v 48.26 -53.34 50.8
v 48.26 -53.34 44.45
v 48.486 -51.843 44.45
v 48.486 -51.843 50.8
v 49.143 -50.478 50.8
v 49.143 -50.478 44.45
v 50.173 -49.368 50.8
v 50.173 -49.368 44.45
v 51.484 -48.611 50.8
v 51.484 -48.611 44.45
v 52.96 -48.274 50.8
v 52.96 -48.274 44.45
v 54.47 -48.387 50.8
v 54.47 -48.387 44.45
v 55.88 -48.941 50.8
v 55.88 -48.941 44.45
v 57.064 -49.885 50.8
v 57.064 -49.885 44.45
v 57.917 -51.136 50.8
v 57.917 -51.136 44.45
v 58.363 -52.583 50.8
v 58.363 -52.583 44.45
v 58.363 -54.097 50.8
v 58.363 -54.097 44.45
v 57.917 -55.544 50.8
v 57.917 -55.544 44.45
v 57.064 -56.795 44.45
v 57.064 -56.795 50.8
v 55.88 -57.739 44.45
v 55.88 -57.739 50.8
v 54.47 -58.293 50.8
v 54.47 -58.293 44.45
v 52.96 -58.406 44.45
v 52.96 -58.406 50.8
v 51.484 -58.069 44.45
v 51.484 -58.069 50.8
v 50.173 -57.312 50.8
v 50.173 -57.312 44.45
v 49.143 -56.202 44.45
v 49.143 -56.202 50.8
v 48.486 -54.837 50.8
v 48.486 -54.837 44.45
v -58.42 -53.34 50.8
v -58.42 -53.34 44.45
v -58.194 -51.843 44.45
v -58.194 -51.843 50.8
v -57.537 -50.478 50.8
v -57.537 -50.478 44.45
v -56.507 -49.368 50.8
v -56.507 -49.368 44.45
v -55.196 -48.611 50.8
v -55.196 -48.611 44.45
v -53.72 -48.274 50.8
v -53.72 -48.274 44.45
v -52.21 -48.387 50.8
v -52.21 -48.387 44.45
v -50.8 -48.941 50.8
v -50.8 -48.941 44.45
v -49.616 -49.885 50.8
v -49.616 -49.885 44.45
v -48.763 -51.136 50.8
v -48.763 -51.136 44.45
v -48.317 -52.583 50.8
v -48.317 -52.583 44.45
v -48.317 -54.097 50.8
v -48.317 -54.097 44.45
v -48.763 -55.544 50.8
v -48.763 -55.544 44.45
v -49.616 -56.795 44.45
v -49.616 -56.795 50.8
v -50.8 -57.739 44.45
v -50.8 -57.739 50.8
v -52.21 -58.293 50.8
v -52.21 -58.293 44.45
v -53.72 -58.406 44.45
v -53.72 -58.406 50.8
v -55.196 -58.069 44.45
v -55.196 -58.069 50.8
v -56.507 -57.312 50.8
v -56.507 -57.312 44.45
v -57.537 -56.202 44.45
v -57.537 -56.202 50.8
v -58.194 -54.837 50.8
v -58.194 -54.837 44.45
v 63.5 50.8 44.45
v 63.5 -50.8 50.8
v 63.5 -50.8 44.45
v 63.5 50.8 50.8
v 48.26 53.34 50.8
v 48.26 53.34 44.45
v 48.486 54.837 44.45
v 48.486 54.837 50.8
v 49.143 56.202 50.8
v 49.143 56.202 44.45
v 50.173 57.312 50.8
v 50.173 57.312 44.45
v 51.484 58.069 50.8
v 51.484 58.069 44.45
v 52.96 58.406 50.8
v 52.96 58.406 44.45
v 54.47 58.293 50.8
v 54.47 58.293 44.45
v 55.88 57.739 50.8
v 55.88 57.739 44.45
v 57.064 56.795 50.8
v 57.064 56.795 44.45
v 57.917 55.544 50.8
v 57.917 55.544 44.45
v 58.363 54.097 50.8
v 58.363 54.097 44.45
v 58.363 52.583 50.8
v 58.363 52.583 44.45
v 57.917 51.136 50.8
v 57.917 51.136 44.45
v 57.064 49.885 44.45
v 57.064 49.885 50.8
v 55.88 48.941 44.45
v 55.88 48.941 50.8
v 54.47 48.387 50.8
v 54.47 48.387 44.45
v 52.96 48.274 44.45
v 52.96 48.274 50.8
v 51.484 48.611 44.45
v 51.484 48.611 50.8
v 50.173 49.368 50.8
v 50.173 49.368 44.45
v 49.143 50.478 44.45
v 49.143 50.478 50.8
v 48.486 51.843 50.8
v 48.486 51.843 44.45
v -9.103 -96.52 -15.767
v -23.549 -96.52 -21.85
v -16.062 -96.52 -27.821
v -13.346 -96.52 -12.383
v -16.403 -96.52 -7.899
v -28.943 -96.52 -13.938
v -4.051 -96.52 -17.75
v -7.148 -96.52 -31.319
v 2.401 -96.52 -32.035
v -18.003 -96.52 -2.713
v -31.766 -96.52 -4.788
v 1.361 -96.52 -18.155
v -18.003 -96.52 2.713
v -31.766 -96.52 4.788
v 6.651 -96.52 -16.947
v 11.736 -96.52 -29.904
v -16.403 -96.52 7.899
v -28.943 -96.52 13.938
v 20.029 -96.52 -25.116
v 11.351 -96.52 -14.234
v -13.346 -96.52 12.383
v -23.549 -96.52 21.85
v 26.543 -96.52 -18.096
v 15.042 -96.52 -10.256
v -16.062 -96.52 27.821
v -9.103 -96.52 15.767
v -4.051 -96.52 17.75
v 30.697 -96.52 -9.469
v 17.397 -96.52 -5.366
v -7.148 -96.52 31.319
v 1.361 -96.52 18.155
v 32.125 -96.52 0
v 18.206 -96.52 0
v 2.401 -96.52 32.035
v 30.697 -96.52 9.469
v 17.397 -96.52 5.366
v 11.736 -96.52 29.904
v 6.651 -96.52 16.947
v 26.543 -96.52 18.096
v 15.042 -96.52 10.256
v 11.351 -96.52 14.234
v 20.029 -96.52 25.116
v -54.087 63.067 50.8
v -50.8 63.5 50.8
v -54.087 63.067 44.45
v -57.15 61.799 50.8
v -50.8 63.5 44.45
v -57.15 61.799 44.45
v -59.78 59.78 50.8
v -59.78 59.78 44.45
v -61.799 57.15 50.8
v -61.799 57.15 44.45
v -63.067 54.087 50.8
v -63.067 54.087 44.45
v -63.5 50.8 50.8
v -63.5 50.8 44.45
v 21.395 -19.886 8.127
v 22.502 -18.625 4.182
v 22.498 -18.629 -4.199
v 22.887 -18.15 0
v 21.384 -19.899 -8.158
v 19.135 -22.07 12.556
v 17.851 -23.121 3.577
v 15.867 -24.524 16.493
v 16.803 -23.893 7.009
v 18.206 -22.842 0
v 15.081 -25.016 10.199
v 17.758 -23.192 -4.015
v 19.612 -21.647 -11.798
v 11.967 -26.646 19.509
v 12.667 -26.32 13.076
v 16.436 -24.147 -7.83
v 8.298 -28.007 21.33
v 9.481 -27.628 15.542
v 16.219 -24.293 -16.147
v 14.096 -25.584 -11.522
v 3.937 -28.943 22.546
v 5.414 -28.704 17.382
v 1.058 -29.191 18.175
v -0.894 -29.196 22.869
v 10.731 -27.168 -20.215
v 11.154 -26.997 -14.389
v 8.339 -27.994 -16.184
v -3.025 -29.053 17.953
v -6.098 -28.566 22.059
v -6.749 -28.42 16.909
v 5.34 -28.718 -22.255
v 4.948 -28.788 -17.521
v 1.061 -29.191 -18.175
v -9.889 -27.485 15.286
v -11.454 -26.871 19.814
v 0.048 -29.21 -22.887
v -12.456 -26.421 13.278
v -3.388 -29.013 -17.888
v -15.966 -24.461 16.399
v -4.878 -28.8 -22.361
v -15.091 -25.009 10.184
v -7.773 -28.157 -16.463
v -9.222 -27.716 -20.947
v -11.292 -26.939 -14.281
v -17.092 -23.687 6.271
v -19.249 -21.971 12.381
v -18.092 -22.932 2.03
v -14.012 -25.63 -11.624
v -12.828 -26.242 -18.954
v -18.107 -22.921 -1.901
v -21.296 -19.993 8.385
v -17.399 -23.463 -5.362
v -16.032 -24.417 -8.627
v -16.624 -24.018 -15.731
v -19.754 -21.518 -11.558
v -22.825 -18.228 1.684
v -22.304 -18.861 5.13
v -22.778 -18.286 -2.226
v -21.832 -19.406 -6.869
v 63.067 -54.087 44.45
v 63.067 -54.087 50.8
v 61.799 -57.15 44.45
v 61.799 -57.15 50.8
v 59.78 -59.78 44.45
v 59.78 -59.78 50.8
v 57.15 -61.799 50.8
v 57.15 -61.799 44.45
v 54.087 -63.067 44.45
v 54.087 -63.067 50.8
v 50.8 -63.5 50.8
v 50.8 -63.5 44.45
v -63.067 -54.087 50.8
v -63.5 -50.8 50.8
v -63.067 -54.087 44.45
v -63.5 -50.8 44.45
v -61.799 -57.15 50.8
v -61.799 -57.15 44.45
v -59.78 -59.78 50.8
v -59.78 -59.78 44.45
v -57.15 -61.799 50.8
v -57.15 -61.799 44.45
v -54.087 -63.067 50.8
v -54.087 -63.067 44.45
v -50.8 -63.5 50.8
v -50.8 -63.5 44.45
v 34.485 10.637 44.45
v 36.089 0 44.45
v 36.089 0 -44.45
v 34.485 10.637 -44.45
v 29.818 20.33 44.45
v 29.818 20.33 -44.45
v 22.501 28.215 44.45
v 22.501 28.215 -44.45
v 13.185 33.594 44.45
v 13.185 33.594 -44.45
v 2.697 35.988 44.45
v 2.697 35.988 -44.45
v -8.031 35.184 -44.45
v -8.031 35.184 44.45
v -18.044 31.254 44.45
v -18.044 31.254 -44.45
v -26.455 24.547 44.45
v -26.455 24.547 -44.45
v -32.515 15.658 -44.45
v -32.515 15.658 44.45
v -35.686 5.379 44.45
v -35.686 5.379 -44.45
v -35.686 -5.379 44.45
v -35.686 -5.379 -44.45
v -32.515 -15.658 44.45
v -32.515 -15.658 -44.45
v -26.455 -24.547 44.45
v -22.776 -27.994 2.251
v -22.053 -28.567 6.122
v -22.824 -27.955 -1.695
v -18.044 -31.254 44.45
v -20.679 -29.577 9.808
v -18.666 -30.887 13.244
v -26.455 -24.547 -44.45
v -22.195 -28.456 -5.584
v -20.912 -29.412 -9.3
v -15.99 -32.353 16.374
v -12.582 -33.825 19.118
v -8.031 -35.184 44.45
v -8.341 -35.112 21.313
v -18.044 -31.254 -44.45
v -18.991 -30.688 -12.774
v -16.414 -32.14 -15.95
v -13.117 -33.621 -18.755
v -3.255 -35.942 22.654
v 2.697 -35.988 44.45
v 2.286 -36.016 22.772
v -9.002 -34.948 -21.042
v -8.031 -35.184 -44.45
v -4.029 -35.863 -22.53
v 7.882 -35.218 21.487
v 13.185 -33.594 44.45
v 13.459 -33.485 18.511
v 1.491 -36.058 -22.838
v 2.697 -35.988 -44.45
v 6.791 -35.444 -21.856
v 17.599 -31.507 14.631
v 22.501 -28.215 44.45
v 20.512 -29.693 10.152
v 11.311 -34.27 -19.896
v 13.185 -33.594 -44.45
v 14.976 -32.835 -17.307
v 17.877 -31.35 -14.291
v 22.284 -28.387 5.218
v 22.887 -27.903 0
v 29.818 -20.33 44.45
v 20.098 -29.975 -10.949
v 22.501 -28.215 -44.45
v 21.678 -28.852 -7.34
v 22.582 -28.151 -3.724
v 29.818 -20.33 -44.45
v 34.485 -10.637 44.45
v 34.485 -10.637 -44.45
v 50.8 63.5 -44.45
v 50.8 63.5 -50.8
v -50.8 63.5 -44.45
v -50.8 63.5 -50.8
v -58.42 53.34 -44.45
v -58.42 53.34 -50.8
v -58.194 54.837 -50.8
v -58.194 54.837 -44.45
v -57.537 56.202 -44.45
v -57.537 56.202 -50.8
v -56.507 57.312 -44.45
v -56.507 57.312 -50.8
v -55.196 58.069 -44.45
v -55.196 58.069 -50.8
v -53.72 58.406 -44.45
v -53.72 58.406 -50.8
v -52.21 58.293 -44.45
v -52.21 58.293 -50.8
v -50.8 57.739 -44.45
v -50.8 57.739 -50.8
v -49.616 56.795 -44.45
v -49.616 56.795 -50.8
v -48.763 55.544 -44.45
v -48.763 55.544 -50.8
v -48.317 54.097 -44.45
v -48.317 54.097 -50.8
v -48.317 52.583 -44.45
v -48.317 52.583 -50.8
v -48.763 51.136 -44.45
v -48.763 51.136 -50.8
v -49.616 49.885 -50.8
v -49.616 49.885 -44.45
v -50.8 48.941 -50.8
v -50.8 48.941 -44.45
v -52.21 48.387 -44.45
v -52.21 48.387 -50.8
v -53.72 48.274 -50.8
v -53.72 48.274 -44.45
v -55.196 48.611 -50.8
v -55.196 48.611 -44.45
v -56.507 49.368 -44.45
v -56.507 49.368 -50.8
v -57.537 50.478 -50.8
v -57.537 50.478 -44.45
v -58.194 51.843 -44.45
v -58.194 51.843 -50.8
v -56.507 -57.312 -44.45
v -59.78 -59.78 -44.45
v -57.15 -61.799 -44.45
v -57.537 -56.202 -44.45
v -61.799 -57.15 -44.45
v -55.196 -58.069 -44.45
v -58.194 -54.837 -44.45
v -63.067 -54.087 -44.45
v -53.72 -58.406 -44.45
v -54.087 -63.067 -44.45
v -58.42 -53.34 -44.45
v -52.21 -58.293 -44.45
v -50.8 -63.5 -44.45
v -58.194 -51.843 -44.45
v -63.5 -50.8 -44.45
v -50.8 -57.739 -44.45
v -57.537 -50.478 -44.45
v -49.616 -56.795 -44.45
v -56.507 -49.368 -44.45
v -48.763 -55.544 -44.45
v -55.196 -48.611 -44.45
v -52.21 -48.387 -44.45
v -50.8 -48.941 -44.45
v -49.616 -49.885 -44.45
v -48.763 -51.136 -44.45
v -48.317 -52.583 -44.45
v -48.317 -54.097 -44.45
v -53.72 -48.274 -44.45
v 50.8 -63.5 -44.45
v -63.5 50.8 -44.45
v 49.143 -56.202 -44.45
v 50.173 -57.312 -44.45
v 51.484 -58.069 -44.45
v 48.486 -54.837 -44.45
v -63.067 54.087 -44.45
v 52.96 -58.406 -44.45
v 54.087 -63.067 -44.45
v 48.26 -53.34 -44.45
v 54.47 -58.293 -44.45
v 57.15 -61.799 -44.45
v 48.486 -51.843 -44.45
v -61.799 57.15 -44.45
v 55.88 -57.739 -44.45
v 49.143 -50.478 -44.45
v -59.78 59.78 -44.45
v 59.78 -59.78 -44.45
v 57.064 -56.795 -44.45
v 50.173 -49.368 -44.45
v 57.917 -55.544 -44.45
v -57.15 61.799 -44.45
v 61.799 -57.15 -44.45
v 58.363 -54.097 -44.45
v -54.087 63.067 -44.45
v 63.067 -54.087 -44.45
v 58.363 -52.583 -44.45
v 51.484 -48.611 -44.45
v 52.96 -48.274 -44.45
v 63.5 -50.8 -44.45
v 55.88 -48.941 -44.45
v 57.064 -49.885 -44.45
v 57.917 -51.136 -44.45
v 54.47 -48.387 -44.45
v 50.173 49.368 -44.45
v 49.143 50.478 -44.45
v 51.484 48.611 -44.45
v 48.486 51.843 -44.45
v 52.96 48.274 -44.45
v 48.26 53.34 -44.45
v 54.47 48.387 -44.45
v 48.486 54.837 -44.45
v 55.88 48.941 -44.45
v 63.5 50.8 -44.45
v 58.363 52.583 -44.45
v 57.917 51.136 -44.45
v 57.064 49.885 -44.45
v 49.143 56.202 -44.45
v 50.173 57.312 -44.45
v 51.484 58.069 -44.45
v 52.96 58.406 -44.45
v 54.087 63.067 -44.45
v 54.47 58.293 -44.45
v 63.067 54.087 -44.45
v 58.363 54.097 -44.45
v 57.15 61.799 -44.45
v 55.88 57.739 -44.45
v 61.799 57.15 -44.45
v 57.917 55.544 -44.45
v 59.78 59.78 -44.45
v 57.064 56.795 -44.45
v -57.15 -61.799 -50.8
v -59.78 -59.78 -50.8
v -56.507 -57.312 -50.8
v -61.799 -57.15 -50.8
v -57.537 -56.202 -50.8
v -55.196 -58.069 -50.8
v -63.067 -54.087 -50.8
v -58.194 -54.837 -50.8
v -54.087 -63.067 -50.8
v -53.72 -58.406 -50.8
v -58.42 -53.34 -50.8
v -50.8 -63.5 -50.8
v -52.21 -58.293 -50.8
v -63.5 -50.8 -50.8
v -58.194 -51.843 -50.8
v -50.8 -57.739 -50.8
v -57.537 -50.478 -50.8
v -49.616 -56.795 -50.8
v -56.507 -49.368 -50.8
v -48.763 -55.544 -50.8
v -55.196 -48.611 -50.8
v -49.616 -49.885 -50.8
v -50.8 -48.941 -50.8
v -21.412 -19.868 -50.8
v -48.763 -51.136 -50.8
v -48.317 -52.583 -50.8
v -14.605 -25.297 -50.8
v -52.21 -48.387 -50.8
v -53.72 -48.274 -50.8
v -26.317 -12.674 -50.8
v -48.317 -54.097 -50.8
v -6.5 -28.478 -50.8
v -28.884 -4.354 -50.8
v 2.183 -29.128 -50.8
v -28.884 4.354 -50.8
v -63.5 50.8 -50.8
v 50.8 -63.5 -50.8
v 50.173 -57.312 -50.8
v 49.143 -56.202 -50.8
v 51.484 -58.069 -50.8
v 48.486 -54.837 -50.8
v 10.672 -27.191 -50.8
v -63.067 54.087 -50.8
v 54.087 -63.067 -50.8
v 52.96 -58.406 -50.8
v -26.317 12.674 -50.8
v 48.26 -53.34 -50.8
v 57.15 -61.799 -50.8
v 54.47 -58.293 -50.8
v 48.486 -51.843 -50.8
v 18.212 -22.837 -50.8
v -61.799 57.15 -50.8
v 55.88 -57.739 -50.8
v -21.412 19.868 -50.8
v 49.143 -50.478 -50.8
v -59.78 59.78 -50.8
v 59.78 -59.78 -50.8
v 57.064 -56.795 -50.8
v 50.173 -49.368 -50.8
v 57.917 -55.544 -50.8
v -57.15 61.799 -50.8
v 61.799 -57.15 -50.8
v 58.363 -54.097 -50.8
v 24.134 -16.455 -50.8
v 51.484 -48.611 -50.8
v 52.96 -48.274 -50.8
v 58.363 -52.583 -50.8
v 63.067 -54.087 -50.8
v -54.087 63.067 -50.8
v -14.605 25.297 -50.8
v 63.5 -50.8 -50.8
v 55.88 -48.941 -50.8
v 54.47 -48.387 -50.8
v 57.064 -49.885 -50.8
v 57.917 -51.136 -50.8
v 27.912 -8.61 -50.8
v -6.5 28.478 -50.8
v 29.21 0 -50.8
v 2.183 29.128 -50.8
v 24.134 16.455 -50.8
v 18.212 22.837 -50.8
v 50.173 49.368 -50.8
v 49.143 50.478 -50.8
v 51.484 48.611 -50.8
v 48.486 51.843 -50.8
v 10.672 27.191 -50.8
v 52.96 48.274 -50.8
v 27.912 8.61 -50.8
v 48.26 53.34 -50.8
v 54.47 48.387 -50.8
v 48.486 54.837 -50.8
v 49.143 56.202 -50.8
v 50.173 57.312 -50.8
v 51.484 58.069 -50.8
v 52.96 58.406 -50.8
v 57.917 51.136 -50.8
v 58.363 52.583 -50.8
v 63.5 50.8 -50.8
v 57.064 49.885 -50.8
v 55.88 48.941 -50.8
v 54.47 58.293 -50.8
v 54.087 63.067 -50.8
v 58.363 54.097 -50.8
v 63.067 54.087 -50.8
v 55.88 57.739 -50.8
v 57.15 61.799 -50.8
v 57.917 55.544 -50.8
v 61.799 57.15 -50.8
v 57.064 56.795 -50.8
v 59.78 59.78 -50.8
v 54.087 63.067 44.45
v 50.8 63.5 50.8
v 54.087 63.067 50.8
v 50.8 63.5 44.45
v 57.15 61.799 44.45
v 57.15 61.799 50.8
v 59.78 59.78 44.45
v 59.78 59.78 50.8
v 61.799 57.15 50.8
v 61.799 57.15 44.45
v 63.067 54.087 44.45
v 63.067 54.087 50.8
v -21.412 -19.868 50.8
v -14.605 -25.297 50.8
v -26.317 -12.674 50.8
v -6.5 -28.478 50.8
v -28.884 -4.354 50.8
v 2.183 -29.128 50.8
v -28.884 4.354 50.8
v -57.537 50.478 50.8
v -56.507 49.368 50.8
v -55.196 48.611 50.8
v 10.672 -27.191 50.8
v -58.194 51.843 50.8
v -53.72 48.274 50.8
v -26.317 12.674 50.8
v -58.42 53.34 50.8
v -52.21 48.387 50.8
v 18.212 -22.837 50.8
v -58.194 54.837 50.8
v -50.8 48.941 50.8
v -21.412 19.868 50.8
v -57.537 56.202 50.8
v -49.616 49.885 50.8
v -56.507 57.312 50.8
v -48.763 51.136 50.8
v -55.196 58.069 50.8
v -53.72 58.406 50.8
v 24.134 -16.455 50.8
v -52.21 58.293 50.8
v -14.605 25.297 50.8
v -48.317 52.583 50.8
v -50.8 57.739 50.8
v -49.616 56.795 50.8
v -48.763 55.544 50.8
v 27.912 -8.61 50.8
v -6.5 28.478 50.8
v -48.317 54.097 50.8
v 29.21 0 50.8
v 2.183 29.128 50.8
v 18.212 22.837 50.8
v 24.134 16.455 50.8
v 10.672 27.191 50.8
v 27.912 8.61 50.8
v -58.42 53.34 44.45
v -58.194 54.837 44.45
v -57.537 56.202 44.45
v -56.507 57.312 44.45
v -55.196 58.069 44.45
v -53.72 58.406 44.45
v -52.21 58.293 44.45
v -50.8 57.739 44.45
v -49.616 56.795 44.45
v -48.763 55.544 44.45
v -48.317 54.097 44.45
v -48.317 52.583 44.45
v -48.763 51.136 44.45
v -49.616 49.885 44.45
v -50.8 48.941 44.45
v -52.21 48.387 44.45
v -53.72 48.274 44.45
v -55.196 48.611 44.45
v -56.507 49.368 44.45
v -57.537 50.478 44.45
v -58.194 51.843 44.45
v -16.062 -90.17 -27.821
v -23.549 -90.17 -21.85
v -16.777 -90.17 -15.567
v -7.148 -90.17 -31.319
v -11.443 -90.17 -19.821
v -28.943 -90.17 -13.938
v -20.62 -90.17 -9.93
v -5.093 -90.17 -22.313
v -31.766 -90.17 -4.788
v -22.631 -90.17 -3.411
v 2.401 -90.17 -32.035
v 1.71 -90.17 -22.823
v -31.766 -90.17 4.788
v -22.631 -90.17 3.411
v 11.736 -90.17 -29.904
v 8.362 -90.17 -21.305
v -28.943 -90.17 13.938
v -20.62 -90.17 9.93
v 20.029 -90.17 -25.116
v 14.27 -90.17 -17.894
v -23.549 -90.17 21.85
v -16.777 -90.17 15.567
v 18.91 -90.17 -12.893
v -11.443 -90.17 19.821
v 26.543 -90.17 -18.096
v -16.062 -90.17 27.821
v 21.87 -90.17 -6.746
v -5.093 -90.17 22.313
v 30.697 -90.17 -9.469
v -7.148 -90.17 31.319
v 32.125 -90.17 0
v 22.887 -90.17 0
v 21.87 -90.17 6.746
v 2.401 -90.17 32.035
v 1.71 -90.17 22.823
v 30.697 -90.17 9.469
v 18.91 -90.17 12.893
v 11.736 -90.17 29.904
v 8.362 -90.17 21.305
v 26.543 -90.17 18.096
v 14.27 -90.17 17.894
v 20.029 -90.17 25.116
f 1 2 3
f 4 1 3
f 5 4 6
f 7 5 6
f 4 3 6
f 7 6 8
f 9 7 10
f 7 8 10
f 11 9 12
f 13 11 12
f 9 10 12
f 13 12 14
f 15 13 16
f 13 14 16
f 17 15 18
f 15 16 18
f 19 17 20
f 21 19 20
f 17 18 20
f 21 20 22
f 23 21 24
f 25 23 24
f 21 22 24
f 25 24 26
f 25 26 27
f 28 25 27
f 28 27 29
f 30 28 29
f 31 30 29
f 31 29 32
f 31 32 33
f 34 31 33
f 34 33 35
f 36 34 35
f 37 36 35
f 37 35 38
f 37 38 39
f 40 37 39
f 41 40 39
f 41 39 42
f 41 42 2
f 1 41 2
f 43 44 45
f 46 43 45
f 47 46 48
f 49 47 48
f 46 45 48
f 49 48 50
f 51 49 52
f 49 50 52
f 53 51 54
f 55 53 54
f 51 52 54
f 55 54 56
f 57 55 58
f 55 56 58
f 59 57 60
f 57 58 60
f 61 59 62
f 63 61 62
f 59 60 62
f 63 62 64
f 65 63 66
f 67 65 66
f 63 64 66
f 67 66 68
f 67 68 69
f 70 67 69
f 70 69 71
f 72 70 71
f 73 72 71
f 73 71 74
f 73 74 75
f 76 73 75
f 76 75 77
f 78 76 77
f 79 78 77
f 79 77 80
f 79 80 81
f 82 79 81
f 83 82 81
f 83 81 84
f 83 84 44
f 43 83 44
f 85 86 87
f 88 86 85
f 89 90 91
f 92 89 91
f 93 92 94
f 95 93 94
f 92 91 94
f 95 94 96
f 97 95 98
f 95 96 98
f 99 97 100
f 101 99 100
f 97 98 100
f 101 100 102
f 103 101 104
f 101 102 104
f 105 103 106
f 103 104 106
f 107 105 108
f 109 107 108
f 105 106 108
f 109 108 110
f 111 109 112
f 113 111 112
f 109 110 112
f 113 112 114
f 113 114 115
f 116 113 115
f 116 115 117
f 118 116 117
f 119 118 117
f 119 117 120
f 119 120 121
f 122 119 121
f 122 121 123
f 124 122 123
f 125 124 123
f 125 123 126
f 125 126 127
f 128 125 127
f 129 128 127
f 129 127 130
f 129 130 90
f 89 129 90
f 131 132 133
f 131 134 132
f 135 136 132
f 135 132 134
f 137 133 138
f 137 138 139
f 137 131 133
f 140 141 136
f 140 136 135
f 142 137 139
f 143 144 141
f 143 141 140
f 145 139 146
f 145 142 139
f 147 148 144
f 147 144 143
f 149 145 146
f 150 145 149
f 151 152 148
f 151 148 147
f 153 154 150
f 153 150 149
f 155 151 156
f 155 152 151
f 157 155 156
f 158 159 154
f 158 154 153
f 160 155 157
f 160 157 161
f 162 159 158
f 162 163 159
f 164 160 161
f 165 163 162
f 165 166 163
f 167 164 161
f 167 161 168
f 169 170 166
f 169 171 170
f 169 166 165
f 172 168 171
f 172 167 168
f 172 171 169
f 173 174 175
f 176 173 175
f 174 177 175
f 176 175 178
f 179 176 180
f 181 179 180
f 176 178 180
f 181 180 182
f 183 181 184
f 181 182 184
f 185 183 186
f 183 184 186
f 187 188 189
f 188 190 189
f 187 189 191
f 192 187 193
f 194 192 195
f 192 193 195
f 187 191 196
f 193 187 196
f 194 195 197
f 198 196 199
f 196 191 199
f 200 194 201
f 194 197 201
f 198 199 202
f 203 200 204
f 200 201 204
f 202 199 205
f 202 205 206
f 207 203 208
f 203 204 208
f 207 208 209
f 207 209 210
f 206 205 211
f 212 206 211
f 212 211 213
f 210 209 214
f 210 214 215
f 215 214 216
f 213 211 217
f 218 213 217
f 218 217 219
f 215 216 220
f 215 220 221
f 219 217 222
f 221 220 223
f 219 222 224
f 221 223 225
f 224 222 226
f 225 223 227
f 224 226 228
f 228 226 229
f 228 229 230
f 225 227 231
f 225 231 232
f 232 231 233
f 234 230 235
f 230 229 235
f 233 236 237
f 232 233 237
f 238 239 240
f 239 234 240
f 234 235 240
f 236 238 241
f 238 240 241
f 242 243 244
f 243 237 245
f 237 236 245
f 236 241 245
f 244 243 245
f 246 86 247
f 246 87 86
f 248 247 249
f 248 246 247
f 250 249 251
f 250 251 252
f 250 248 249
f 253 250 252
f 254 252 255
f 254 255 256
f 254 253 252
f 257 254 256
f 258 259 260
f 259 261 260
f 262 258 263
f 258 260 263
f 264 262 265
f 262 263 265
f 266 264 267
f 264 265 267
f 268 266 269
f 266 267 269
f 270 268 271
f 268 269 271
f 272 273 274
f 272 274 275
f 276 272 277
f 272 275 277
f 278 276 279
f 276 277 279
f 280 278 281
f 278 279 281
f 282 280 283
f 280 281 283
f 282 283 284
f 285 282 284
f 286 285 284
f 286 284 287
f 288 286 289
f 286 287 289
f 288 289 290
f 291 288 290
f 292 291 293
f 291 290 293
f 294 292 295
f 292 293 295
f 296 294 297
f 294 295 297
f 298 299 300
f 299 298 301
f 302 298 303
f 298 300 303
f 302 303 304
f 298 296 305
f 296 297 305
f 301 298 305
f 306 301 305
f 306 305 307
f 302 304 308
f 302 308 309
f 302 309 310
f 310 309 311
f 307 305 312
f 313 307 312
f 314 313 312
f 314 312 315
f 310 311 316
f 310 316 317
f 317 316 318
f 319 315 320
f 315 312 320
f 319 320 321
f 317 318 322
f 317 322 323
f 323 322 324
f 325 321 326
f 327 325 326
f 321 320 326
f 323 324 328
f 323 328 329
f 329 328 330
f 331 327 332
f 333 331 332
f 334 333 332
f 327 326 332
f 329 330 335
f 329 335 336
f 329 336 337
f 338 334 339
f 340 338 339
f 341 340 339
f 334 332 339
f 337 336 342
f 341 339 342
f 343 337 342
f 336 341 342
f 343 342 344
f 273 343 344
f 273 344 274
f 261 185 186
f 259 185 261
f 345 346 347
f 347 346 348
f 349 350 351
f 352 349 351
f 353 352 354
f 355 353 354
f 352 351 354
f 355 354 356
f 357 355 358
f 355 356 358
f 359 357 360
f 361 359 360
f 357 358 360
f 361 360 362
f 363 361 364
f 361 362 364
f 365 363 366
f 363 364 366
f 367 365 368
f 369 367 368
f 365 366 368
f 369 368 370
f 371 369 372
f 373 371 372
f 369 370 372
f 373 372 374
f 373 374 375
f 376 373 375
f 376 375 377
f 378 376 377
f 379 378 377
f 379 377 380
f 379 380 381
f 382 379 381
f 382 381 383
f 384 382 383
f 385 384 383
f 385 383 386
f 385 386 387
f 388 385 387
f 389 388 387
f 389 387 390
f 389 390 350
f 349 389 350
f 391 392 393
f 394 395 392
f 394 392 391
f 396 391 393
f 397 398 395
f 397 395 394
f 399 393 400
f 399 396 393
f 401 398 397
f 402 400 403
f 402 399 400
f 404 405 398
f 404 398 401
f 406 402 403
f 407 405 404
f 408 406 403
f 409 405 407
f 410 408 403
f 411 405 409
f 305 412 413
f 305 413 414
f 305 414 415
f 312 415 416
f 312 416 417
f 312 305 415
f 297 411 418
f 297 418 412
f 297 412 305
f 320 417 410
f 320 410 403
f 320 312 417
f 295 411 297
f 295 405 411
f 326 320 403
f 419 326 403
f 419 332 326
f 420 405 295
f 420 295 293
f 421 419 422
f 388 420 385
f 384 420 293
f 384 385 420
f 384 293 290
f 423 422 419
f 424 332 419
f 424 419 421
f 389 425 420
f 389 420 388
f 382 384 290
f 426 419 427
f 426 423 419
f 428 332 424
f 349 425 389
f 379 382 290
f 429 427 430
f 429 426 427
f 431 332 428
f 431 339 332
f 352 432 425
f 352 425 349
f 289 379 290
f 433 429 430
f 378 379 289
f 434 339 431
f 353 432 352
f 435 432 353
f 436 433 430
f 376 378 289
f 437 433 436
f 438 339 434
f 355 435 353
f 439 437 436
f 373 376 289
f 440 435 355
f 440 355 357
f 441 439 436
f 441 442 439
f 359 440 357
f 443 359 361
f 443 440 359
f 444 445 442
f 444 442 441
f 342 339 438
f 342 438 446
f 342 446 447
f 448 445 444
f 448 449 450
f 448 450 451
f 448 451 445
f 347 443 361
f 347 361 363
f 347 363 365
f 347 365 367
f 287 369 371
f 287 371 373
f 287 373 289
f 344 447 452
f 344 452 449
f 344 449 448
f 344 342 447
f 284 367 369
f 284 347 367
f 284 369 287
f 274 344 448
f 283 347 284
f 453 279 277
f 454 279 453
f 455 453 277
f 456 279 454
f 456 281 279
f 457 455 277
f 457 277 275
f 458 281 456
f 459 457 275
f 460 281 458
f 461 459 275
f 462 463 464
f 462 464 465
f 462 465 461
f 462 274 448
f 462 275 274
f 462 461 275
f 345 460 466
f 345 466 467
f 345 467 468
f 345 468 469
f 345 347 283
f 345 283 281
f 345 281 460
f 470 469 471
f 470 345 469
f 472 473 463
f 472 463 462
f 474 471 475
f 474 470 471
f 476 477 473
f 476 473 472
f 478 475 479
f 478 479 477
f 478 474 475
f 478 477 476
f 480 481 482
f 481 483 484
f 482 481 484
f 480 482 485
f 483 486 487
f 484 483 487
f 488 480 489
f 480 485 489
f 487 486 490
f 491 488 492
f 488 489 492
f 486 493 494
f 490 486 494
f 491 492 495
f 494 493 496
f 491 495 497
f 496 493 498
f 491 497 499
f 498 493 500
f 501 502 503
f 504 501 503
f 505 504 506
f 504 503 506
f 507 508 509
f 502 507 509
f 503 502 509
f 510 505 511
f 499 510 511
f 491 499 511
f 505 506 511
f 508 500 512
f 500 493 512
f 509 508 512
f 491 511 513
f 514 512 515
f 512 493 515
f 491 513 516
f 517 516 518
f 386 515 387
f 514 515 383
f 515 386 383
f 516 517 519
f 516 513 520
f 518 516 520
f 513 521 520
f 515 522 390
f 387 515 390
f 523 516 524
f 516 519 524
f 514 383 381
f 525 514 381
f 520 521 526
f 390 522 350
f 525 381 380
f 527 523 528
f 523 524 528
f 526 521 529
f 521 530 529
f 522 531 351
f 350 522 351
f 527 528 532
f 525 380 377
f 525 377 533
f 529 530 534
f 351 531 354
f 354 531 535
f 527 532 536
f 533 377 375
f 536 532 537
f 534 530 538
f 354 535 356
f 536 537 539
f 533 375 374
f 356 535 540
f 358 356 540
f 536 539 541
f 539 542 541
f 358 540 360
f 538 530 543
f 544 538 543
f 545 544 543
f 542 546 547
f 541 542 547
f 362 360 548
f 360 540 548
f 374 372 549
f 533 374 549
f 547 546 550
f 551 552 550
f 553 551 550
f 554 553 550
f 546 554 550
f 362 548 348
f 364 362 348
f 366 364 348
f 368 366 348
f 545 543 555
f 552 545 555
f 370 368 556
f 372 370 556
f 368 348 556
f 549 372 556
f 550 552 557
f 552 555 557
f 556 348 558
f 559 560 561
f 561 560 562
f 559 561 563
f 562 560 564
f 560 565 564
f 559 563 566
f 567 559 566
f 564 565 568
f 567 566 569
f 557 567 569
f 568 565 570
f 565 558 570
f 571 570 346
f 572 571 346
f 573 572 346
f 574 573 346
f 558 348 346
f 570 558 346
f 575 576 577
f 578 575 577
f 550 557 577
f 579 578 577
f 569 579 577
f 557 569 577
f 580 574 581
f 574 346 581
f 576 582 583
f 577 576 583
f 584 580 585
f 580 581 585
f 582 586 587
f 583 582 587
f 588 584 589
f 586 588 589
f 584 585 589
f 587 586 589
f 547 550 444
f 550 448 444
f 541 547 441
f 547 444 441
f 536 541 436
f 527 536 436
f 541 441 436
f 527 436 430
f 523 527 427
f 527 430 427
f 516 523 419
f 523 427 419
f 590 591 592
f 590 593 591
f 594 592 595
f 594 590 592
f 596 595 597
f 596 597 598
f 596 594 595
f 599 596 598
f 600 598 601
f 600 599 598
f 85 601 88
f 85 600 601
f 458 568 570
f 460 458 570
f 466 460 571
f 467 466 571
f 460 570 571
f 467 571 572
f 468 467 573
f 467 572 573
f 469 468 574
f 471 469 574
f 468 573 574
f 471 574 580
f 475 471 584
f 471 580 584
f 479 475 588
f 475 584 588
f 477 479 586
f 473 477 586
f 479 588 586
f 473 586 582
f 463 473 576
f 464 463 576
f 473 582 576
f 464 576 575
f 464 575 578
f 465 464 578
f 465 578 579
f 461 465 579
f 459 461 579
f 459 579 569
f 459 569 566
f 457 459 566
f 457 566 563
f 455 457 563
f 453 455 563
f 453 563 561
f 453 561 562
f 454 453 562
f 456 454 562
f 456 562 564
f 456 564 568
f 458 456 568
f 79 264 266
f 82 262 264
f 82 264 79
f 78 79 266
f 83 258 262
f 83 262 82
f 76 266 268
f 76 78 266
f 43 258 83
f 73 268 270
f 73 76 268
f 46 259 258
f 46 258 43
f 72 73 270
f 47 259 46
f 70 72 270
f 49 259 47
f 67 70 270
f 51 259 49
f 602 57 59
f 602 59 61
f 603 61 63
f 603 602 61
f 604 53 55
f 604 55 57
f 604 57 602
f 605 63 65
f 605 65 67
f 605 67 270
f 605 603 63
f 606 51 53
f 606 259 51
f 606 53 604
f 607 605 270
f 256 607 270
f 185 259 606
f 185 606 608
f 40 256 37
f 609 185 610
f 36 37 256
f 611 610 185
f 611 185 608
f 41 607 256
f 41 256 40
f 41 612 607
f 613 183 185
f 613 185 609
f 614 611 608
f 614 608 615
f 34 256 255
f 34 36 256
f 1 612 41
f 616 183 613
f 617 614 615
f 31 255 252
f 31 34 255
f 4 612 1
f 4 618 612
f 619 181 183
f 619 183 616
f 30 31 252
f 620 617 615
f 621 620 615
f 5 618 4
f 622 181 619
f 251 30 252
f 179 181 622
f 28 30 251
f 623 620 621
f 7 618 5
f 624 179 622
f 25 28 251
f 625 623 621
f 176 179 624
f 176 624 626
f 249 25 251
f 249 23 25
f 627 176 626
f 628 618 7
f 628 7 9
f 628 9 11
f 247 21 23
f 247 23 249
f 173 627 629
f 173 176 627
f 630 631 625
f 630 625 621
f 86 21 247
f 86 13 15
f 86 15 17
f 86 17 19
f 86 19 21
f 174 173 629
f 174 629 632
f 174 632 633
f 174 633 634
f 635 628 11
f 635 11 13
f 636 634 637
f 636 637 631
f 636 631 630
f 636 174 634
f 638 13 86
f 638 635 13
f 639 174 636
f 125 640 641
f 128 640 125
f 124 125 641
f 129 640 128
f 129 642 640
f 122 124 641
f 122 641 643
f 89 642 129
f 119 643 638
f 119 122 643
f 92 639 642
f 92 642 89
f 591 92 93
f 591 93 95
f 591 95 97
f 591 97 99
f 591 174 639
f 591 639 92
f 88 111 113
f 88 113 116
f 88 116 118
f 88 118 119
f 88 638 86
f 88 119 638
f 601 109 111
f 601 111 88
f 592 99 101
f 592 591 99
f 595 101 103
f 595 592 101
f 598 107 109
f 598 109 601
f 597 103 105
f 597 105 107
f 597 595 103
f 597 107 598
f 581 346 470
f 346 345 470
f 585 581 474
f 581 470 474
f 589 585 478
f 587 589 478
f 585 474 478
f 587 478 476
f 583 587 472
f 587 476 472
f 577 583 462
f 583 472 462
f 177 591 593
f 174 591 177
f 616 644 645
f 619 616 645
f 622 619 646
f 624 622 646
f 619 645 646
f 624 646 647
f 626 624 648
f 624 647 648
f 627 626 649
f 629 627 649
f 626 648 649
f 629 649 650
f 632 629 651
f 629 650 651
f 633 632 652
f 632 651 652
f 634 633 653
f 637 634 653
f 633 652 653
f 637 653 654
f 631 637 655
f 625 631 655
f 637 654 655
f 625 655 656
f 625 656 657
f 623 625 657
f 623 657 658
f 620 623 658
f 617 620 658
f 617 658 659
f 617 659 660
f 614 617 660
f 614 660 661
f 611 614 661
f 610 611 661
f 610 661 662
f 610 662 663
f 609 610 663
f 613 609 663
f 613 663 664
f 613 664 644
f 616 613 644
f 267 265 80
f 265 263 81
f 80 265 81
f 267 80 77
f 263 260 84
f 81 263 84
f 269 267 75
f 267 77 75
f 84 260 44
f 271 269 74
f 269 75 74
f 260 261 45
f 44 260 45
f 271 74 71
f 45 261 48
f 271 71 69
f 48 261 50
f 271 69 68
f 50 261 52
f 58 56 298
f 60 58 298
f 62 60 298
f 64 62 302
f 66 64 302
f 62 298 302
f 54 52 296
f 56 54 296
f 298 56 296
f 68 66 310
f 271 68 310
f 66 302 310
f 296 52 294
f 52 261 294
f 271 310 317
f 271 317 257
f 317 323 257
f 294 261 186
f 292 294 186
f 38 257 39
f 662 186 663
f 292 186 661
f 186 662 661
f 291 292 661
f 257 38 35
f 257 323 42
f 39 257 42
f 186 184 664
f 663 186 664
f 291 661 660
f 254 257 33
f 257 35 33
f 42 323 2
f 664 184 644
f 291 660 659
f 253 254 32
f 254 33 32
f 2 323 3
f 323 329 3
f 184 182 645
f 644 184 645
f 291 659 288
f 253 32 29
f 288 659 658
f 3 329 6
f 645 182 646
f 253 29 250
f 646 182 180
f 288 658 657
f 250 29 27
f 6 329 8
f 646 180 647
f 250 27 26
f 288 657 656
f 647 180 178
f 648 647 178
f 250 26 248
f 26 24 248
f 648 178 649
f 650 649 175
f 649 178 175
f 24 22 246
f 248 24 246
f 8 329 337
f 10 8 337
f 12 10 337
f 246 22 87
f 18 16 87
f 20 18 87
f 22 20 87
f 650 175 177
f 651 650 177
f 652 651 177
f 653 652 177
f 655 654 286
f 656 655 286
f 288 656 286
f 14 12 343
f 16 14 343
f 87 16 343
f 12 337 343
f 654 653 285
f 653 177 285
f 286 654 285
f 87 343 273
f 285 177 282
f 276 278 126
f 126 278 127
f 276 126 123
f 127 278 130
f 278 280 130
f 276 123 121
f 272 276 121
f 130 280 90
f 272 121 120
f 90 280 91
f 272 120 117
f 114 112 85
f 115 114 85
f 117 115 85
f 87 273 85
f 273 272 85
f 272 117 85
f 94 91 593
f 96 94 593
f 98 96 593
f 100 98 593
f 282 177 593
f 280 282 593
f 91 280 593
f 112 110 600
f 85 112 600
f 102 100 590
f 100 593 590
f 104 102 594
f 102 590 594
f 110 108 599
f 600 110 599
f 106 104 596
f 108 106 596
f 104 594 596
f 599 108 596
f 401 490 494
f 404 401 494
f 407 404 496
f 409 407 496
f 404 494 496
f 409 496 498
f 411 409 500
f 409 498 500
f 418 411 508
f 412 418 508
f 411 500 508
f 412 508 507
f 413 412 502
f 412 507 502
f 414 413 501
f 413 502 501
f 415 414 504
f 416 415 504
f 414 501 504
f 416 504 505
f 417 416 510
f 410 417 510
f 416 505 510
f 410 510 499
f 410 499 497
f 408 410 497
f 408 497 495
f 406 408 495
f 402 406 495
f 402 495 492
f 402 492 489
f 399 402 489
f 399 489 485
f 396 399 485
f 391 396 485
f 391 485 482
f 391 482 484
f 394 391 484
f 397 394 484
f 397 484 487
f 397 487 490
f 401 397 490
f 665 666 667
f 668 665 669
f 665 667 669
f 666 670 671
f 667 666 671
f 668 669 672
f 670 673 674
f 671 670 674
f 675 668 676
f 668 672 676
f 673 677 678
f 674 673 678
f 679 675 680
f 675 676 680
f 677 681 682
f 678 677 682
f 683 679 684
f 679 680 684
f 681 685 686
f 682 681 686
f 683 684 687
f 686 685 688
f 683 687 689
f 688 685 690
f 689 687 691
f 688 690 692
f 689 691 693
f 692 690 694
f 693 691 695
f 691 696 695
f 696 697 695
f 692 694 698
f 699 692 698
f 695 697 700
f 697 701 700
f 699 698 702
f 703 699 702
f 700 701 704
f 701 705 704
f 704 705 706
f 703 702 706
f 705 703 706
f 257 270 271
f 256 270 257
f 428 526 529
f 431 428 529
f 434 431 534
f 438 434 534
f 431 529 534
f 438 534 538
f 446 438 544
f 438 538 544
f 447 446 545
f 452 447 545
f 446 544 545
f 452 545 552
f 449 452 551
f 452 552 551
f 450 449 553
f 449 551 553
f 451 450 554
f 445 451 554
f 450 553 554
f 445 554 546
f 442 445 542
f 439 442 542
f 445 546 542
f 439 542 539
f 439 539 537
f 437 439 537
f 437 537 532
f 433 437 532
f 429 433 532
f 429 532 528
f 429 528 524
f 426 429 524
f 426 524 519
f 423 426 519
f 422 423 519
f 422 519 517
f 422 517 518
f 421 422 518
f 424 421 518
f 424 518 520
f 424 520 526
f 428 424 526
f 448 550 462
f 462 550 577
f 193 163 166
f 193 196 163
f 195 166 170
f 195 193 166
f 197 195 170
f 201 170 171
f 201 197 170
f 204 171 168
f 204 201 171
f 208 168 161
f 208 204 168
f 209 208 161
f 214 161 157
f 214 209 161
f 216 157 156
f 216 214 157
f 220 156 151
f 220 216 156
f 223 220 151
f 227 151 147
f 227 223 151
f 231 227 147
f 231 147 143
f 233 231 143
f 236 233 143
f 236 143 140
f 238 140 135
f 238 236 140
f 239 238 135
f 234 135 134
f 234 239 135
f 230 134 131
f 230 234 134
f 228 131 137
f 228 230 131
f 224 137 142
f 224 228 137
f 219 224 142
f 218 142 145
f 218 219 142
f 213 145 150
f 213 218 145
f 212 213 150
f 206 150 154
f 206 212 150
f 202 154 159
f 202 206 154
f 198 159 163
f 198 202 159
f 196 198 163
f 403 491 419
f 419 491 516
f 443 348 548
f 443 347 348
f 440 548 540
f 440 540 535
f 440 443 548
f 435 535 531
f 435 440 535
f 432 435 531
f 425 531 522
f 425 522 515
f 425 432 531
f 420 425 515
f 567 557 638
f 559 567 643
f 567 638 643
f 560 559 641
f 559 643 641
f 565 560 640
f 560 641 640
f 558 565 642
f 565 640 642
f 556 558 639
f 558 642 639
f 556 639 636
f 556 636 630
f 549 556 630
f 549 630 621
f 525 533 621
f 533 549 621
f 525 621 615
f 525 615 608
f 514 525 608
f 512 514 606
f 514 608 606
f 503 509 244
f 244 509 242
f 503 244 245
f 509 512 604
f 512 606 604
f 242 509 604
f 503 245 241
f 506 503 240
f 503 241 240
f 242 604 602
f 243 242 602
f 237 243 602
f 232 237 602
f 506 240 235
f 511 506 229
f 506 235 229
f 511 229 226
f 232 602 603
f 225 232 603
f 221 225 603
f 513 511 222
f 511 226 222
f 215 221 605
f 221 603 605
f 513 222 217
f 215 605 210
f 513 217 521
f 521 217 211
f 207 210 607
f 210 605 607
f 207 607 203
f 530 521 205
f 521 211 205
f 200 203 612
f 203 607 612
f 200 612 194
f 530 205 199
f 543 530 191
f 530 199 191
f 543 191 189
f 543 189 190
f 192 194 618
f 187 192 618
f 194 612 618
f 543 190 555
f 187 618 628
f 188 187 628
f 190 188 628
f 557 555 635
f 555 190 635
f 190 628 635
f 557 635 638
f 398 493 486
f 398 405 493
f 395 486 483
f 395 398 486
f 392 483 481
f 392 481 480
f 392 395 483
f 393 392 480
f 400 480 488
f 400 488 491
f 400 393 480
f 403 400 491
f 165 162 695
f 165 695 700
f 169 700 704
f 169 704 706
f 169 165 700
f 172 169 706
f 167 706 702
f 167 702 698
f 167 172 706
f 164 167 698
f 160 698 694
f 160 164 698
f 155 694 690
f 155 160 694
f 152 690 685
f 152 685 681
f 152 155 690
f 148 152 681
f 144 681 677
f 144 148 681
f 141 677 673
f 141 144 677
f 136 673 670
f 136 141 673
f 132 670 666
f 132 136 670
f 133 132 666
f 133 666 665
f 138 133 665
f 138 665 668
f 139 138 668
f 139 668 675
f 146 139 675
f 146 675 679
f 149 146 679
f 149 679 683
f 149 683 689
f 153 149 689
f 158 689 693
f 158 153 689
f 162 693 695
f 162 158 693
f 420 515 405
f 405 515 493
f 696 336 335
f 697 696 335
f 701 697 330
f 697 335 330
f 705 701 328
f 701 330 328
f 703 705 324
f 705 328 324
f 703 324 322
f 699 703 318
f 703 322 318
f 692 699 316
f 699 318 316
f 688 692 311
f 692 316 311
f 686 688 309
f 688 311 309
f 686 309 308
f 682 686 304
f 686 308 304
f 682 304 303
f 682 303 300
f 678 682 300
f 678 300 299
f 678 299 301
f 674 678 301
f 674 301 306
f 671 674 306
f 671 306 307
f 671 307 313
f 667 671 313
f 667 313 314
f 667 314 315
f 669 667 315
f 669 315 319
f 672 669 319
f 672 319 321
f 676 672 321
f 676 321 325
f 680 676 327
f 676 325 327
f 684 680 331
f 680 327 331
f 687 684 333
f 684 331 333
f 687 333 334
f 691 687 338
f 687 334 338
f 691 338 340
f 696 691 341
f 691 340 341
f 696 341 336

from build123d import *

# Parameters (mm, degrees)
F0_R      = 36.0888023615
F0_R_2    = 29.21
F1_DEPTH  = 50.8
F2_R      = 36.0888023615
F3_DEPTH  = 6.35
F6_R      = 22.8868793225
F6_R_2    = 18.2059808832
F7_DEPTH  = 96.52
F8_DEPTH  = 76.2
F10_D     = 58.42
F10_DEPTH = 101.6
F10_TIP   = 17.5511386818
F11_R     = 32.1245501008
F11_R_2   = 22.8868793225
F11_R_3   = 18.2059808832
F12_DEPTH = 6.35
F14_D     = 10.16
F15_R     = 12.7


with BuildPart() as f1:
    # F0 (on Top) → F1 (new body)
    with BuildSketch(Plane.XY):
        Circle(F0_R)
        Circle(F0_R_2, mode=Mode.SUBTRACT)
    extrude(amount=F1_DEPTH)


with BuildPart() as f3:
    # F2 (on face) → F3 (new body)
    with BuildSketch(Plane.XY.offset(50.8)):
        Polygon((63.5, 63.5), (0, 63.5), (-63.5, 63.5), (-63.5, 0), (-63.5, -63.5), (0, -63.5), (63.5, -63.5), (63.5, 0), align=None)
        Circle(F2_R, mode=Mode.SUBTRACT)
    extrude(amount=-F3_DEPTH)

    # F4: union F1
    add(f1.part)

    # F5: F3 across plane


with BuildPart() as f3_1:
    add(f3.part)
    add(f3.part.mirror(Plane.XY))

    # F6 (on Front) → F7 (join)
    with BuildSketch(Plane.XZ):
        Circle(F6_R)
        Circle(F6_R_2, mode=Mode.SUBTRACT)
    extrude(amount=F7_DEPTH)

    # F6 (on Front) → F8 (cut)
    with BuildSketch(Plane.XZ):
        Circle(F6_R_2)
    extrude(amount=F8_DEPTH, mode=Mode.SUBTRACT)

    # F10
    with Locations(Plane.XY.offset(50.8)):
        with Locations((0, 0)):
            Hole(F10_D / 2, depth=F10_DEPTH)
            with Locations((0, 0, -(F10_DEPTH + F10_TIP / 2))):  # 118° drill point
                Cone(0, F10_D / 2, F10_TIP, mode=Mode.SUBTRACT)

    # F11 (on face) → F12 (join)
    with BuildSketch(Plane.XZ.offset(96.52)):
        Circle(F11_R)
        Circle(F11_R_2, mode=Mode.SUBTRACT)
        Circle(F11_R_2)
        Circle(F11_R_3, mode=Mode.SUBTRACT)
    extrude(amount=-F12_DEPTH)

    # F14 (through all)
    with Locations(Plane.XY.offset(50.8)):
        with Locations((53.34, 53.34), (53.34, -53.34), (-53.34, -53.34), (-53.34, 53.34)):
            Hole(F14_D / 2)

    # F15
    f15_edges = [f3_1.edges().sort_by_distance(p)[0] for p in [
        (-63.5, 63.5, -47.625),
        (-63.5, 63.5, 47.625),
        (-63.5, -63.5, -47.625),
        (-63.5, -63.5, 47.625),
        (63.5, -63.5, 47.625),
        (63.5, -63.5, -47.625),
        (63.5, 63.5, 47.625),
        (63.5, 63.5, -47.625),
    ]]
    fillet(f15_edges, radius=F15_R)


solid = f3_1.part
